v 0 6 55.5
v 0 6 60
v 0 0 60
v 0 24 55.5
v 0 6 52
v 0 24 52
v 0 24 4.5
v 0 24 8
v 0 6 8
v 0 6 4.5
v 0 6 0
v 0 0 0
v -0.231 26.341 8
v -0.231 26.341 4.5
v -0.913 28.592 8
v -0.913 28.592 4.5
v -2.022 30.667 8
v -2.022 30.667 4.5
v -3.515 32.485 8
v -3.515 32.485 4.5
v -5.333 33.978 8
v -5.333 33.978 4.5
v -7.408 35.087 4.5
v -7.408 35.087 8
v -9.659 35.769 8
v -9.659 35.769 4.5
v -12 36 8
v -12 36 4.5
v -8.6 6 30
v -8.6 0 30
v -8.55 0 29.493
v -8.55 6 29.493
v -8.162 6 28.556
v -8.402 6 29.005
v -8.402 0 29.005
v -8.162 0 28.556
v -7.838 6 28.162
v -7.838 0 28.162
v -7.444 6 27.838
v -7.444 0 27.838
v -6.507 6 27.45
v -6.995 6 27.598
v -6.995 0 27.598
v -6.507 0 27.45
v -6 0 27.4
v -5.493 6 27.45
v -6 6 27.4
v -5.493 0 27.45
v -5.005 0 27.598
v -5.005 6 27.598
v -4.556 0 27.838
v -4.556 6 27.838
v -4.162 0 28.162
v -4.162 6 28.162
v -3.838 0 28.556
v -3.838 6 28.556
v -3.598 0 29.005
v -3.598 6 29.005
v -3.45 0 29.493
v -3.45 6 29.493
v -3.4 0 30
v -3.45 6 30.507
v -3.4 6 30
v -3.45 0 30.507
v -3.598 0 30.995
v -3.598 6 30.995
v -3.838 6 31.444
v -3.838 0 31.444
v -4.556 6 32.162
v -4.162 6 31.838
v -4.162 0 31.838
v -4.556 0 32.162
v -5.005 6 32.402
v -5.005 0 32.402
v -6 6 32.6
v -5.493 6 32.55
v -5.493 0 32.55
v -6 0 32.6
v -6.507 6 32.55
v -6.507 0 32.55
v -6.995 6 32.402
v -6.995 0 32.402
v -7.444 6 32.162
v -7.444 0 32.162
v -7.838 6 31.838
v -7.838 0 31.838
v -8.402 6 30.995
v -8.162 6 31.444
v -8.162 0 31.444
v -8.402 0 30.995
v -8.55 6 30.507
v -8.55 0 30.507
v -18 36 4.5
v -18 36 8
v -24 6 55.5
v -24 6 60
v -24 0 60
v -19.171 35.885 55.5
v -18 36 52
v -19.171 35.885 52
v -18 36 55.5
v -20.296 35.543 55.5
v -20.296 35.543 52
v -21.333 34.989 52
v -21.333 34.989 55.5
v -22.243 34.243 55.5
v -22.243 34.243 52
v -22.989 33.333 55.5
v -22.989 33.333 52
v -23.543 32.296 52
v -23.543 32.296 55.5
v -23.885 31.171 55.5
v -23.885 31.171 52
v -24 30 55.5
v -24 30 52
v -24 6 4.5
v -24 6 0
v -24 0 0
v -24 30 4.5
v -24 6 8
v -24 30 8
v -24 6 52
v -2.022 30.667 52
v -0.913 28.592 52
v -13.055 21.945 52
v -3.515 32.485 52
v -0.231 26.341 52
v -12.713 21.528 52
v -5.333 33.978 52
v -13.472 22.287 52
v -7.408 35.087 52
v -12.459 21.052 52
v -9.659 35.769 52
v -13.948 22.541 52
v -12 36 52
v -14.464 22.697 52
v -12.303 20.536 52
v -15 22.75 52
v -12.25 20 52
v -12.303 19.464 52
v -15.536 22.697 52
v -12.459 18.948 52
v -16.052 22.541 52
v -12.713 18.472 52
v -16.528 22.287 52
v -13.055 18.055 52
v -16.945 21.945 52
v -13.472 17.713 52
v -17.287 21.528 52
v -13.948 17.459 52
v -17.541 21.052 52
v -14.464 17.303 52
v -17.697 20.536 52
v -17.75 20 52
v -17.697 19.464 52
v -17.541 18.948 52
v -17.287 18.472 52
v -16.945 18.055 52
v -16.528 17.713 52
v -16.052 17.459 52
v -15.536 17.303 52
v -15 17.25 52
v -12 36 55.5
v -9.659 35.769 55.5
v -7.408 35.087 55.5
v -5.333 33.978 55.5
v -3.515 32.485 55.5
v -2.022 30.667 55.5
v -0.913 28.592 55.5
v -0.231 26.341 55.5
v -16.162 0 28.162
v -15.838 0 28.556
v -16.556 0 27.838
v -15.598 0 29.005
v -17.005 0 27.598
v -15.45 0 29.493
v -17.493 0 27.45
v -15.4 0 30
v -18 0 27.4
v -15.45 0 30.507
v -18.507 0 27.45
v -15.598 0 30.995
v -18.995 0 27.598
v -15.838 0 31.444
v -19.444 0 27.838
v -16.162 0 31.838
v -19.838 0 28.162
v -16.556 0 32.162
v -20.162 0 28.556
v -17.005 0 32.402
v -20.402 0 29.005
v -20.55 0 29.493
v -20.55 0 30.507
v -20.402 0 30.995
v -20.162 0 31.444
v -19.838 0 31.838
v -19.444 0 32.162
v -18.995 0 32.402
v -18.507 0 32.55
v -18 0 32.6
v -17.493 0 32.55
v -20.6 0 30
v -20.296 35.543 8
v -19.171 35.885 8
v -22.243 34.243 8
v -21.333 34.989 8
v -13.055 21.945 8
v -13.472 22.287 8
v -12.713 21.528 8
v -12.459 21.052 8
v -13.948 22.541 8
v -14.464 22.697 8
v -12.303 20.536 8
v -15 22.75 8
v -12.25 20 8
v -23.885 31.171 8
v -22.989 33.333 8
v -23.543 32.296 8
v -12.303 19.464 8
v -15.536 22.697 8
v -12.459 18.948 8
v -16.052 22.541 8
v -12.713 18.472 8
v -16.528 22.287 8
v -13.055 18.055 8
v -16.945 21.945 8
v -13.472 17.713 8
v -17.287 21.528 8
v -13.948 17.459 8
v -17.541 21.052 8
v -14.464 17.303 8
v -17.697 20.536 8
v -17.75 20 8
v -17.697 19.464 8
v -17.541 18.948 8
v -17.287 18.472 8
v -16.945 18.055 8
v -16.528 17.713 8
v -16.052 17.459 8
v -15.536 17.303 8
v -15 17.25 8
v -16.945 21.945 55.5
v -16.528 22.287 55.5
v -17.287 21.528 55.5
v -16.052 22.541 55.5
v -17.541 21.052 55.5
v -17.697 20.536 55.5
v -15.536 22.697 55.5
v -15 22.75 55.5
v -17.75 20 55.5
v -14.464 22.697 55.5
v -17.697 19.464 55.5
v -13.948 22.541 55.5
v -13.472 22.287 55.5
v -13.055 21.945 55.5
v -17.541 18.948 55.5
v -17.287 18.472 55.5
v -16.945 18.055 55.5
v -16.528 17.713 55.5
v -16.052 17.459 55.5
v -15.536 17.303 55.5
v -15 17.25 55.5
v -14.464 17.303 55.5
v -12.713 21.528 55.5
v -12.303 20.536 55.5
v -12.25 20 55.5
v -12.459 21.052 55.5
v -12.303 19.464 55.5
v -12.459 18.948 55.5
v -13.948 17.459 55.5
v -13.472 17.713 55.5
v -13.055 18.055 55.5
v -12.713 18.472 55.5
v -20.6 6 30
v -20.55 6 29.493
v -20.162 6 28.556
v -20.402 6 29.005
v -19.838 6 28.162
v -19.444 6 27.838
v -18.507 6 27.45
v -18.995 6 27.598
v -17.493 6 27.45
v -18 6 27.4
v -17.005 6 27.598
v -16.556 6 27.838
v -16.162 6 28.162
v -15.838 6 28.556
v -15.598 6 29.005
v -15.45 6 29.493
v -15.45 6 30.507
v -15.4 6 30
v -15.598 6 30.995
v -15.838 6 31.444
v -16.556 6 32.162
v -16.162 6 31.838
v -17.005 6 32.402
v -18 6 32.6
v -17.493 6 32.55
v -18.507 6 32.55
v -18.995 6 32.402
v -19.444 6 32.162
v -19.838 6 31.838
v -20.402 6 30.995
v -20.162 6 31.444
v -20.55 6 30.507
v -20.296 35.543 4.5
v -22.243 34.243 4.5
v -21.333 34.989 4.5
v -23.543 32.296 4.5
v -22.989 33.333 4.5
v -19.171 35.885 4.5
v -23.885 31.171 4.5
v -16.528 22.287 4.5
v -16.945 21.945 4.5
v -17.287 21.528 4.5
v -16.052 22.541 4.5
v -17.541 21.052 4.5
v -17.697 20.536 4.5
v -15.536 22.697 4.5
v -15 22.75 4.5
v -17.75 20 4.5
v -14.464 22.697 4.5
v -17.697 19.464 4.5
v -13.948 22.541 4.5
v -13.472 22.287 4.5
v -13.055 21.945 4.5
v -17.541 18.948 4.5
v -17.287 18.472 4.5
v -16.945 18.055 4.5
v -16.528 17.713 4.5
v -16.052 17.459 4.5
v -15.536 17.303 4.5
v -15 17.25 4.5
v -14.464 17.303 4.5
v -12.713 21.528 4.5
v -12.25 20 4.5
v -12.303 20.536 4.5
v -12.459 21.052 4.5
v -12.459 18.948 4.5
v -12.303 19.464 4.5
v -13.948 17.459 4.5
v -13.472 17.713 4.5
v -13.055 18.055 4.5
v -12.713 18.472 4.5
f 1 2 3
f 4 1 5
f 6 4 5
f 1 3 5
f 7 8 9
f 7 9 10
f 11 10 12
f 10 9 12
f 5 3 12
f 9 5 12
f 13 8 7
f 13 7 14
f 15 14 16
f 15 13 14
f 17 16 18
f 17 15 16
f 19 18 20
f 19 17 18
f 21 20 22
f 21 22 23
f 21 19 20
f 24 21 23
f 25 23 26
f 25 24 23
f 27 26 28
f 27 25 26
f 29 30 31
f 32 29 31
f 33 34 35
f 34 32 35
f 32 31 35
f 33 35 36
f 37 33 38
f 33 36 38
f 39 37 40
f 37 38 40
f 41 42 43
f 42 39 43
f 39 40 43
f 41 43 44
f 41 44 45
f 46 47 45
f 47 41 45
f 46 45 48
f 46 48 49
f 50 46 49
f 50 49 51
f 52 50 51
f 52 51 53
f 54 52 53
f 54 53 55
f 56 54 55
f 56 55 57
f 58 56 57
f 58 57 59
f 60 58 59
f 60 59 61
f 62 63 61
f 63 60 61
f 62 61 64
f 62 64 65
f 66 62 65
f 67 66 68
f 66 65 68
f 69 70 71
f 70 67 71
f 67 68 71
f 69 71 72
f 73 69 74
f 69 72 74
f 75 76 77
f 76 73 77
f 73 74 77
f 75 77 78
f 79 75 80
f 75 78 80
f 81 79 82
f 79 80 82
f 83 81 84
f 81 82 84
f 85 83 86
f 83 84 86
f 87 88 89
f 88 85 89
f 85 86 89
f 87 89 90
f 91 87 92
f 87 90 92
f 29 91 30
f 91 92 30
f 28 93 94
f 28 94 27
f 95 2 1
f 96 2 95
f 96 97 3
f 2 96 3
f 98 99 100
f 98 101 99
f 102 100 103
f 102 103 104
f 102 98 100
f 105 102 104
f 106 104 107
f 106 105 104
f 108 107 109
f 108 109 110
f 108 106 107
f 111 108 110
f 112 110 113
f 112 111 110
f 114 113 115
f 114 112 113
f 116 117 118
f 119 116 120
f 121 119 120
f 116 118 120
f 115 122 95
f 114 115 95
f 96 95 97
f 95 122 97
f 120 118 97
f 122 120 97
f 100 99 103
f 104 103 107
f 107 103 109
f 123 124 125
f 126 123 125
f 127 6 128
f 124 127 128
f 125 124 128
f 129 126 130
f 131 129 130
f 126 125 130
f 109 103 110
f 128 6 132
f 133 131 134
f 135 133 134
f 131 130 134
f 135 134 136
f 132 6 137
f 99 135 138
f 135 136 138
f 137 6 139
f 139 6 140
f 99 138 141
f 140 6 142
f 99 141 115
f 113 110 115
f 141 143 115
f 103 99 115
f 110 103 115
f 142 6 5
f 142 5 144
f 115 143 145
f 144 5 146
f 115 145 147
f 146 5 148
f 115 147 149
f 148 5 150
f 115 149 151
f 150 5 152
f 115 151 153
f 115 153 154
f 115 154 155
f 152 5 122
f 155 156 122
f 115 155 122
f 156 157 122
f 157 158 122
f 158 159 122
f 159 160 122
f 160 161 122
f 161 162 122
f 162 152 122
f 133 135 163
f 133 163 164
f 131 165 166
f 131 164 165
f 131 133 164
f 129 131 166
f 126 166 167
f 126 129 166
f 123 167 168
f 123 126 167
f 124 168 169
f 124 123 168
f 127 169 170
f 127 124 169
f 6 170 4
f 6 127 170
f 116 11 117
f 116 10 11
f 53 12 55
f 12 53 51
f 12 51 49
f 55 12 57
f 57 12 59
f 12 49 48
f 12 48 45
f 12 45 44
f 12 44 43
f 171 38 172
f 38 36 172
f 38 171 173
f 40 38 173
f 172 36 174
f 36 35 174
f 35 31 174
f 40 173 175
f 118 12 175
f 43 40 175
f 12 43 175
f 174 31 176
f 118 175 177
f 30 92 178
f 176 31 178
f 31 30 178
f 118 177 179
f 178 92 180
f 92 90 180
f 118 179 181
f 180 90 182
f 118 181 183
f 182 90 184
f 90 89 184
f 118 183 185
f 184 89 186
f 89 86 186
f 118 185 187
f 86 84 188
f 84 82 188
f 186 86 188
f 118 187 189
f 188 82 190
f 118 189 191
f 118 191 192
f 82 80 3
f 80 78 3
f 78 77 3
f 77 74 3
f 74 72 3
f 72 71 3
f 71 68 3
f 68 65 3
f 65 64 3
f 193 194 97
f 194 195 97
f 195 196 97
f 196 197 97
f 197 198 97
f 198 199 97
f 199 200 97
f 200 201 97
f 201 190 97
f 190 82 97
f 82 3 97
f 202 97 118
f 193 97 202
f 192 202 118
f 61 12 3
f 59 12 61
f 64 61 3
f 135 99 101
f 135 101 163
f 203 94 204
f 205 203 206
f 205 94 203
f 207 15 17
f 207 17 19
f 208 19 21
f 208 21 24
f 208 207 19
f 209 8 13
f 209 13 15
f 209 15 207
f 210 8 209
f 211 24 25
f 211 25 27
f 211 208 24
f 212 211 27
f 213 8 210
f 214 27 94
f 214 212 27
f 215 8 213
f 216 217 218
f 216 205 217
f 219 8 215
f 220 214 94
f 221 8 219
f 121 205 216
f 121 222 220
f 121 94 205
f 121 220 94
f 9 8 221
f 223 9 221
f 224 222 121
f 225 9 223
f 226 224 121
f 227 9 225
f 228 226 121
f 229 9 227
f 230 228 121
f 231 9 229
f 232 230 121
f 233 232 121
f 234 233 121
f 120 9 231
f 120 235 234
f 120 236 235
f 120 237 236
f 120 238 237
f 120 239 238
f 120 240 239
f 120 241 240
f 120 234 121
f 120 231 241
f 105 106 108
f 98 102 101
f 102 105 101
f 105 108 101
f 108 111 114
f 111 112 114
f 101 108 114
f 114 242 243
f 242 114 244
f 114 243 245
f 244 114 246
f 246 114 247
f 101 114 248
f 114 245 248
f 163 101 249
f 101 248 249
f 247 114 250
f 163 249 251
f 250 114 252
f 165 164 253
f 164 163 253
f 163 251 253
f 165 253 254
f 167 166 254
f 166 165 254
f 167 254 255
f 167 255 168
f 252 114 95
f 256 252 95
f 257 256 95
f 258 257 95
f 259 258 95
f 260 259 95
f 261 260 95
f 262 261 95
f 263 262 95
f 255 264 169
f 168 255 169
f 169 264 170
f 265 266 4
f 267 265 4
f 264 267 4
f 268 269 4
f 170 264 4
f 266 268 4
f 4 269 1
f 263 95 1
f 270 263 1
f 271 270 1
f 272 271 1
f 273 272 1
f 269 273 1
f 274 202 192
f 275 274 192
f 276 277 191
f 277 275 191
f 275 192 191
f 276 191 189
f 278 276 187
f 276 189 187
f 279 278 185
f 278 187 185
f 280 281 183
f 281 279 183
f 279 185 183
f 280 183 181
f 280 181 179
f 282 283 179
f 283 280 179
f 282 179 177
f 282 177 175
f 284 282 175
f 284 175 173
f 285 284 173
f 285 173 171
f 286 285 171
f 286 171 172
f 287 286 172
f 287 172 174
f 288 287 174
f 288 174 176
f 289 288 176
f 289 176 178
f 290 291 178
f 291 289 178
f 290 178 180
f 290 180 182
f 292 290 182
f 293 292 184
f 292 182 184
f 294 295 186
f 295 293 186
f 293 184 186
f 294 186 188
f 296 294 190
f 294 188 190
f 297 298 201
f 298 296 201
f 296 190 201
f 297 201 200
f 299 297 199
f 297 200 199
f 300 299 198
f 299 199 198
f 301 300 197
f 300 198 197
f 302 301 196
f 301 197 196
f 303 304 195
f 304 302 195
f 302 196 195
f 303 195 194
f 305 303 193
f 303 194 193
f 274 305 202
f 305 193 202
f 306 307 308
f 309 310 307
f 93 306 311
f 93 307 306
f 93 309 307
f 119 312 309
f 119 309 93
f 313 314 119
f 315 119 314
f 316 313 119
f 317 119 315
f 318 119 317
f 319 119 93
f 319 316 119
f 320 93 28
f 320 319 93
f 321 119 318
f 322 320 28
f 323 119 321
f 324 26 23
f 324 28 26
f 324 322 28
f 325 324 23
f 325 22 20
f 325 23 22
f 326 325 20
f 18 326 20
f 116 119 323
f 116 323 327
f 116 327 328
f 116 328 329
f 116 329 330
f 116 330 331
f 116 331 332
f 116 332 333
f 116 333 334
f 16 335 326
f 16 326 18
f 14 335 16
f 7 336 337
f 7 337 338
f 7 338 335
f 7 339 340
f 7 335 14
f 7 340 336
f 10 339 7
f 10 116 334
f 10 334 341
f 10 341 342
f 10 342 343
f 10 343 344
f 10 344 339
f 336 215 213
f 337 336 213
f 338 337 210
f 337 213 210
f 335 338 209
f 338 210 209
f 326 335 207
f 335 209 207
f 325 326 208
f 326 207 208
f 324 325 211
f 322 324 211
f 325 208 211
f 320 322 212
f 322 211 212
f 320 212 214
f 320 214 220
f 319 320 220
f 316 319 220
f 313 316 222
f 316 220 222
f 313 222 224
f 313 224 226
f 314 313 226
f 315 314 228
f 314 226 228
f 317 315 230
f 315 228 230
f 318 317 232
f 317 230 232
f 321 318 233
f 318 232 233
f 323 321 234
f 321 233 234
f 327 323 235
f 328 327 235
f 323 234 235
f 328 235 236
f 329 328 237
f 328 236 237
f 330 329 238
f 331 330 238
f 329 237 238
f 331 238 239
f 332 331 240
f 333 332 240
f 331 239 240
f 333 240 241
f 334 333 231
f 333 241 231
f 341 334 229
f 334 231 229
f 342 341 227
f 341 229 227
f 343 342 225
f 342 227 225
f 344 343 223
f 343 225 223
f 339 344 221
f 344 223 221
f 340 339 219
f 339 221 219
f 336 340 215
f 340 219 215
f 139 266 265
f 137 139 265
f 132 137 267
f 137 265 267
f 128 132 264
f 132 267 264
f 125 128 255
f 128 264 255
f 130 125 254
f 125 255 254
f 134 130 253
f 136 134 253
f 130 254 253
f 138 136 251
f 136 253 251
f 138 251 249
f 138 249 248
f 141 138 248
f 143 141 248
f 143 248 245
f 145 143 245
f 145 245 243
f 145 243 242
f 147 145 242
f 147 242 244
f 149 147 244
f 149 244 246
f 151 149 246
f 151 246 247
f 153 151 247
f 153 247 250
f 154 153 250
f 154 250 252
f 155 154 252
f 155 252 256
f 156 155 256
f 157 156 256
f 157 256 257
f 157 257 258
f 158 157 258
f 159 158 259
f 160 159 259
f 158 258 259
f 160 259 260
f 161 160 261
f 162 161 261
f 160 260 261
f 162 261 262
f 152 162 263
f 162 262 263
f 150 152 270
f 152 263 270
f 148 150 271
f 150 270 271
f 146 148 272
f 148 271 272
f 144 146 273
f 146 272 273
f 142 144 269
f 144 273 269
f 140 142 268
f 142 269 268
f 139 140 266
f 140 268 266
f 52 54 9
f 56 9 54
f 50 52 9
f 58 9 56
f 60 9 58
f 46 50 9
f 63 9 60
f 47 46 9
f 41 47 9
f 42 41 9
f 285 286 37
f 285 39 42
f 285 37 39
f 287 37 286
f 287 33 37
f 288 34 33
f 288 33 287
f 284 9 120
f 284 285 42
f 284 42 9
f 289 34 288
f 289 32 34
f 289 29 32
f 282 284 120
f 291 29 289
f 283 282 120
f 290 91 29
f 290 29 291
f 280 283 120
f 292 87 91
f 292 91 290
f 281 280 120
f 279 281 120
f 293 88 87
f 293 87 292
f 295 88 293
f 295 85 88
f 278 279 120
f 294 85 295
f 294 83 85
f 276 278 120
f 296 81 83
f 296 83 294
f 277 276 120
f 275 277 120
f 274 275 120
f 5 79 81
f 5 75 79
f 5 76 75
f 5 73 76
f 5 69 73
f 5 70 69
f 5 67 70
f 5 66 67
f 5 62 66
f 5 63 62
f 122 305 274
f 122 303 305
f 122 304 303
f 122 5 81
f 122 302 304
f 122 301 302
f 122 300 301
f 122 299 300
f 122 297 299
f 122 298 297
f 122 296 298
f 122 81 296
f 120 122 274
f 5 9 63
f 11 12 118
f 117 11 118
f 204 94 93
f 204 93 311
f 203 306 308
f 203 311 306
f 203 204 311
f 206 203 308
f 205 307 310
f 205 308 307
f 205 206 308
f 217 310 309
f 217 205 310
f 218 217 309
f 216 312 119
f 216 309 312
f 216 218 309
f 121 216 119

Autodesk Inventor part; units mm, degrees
ref_plane "YZ Plane" through (0, 0, 0) normal (1, 0, 0) x (0, 1, 0)
ref_plane "XZ Plane" through (0, 0, 0) normal (0, 1, 0) x (-1, 0, 0)
ref_plane "XY Plane" through (0, 0, 0) normal (0, 0, 1) x (1, 0, 0)
sketch "Sketch1" plane through (0, 0, 0) normal (0, 1, 0) x (-1, 0, 0)
  line L0 (0, 0) -> (24, 0)
  line L1 (24, 0) -> (24, 60)
  line L2 (24, 60) -> (0, 60)
  line L3 (0, 60) -> (0, 0)
  line L4 (24, 30) -> (0, 30) construction
  circle A0 centre (18, 30) radius 2.6
  circle A1 centre (6, 30) radius 2.6
  dimension "d0" = 24
  dimension "d1" = 60
  dimension "d2" = 5.2
  dimension "d3" = 5.2
  dimension "d4" = 6
  dimension "d5" = 6
  dimension "d6" = 12
extrude "Extrusion1" add sketch "Sketch1" along normal blind 6
sketch "Sketch2" plane through (0, 6, 0) normal (0, 1, 0) x (1, 0, 0)
  line L0 (-24, 0) -> (-24, -60) projected
  line L1 (-24, -4.5) -> (0, -4.5)
  line L2 (0, -4.5) -> (0, -8)
  line L3 (0, -8) -> (-24, -8)
  line L4 (-24, -8) -> (-24, -4.5)
  line L5 (-24, -55.5) -> (0, -55.5)
  line L6 (0, -55.5) -> (0, -52)
  line L7 (0, -52) -> (-24, -52)
  line L8 (-24, -52) -> (-24, -55.5)
  line L9 (0, 0) -> (-24, 0) projected
  dimension "d9" = 24
  dimension "d10" = 24
  dimension "d12" = 51
  dimension "d13" = 3.5
  dimension "d14" = 3.5
  dimension "d15" = 4.5
extrude "Extrusion2" add sketch "Sketch2" along normal blind 30
sketch "Sketch3" plane through (-24, 6, 55.5) normal (0, 0, 1) x (1, 0, 0)
  point P0 (24, -6)
sketch "Sketch4" plane through (-24, 6, 55.5) normal (0, 0, 1) x (1, 0, 0)
  circle A0 centre (9, 14) radius 2.75
  line L0 (0, 0) -> (24, 0) projected
  line L1 (0, 0) -> (0, 30) projected
  point P0 (24, -6)
  dimension "d18" = 5.5
  dimension "d19" = 14
  dimension "d20" = 9
extrude "Extrusion3" cut sketch "Sketch4" against normal through all
fillet "Fillet1" radius 12 2 edges at (0, 36, 53.75) (0, 36, 6.25)
fillet "Fillet2" radius 6 2 edges at (-24, 36, 53.75) (-24, 36, 6.25)
equation "\"d5\" = d4"
equation "\"d14\" = d13"
properties part number "X Axis Drag Chain Mount Statonary Bolted"
